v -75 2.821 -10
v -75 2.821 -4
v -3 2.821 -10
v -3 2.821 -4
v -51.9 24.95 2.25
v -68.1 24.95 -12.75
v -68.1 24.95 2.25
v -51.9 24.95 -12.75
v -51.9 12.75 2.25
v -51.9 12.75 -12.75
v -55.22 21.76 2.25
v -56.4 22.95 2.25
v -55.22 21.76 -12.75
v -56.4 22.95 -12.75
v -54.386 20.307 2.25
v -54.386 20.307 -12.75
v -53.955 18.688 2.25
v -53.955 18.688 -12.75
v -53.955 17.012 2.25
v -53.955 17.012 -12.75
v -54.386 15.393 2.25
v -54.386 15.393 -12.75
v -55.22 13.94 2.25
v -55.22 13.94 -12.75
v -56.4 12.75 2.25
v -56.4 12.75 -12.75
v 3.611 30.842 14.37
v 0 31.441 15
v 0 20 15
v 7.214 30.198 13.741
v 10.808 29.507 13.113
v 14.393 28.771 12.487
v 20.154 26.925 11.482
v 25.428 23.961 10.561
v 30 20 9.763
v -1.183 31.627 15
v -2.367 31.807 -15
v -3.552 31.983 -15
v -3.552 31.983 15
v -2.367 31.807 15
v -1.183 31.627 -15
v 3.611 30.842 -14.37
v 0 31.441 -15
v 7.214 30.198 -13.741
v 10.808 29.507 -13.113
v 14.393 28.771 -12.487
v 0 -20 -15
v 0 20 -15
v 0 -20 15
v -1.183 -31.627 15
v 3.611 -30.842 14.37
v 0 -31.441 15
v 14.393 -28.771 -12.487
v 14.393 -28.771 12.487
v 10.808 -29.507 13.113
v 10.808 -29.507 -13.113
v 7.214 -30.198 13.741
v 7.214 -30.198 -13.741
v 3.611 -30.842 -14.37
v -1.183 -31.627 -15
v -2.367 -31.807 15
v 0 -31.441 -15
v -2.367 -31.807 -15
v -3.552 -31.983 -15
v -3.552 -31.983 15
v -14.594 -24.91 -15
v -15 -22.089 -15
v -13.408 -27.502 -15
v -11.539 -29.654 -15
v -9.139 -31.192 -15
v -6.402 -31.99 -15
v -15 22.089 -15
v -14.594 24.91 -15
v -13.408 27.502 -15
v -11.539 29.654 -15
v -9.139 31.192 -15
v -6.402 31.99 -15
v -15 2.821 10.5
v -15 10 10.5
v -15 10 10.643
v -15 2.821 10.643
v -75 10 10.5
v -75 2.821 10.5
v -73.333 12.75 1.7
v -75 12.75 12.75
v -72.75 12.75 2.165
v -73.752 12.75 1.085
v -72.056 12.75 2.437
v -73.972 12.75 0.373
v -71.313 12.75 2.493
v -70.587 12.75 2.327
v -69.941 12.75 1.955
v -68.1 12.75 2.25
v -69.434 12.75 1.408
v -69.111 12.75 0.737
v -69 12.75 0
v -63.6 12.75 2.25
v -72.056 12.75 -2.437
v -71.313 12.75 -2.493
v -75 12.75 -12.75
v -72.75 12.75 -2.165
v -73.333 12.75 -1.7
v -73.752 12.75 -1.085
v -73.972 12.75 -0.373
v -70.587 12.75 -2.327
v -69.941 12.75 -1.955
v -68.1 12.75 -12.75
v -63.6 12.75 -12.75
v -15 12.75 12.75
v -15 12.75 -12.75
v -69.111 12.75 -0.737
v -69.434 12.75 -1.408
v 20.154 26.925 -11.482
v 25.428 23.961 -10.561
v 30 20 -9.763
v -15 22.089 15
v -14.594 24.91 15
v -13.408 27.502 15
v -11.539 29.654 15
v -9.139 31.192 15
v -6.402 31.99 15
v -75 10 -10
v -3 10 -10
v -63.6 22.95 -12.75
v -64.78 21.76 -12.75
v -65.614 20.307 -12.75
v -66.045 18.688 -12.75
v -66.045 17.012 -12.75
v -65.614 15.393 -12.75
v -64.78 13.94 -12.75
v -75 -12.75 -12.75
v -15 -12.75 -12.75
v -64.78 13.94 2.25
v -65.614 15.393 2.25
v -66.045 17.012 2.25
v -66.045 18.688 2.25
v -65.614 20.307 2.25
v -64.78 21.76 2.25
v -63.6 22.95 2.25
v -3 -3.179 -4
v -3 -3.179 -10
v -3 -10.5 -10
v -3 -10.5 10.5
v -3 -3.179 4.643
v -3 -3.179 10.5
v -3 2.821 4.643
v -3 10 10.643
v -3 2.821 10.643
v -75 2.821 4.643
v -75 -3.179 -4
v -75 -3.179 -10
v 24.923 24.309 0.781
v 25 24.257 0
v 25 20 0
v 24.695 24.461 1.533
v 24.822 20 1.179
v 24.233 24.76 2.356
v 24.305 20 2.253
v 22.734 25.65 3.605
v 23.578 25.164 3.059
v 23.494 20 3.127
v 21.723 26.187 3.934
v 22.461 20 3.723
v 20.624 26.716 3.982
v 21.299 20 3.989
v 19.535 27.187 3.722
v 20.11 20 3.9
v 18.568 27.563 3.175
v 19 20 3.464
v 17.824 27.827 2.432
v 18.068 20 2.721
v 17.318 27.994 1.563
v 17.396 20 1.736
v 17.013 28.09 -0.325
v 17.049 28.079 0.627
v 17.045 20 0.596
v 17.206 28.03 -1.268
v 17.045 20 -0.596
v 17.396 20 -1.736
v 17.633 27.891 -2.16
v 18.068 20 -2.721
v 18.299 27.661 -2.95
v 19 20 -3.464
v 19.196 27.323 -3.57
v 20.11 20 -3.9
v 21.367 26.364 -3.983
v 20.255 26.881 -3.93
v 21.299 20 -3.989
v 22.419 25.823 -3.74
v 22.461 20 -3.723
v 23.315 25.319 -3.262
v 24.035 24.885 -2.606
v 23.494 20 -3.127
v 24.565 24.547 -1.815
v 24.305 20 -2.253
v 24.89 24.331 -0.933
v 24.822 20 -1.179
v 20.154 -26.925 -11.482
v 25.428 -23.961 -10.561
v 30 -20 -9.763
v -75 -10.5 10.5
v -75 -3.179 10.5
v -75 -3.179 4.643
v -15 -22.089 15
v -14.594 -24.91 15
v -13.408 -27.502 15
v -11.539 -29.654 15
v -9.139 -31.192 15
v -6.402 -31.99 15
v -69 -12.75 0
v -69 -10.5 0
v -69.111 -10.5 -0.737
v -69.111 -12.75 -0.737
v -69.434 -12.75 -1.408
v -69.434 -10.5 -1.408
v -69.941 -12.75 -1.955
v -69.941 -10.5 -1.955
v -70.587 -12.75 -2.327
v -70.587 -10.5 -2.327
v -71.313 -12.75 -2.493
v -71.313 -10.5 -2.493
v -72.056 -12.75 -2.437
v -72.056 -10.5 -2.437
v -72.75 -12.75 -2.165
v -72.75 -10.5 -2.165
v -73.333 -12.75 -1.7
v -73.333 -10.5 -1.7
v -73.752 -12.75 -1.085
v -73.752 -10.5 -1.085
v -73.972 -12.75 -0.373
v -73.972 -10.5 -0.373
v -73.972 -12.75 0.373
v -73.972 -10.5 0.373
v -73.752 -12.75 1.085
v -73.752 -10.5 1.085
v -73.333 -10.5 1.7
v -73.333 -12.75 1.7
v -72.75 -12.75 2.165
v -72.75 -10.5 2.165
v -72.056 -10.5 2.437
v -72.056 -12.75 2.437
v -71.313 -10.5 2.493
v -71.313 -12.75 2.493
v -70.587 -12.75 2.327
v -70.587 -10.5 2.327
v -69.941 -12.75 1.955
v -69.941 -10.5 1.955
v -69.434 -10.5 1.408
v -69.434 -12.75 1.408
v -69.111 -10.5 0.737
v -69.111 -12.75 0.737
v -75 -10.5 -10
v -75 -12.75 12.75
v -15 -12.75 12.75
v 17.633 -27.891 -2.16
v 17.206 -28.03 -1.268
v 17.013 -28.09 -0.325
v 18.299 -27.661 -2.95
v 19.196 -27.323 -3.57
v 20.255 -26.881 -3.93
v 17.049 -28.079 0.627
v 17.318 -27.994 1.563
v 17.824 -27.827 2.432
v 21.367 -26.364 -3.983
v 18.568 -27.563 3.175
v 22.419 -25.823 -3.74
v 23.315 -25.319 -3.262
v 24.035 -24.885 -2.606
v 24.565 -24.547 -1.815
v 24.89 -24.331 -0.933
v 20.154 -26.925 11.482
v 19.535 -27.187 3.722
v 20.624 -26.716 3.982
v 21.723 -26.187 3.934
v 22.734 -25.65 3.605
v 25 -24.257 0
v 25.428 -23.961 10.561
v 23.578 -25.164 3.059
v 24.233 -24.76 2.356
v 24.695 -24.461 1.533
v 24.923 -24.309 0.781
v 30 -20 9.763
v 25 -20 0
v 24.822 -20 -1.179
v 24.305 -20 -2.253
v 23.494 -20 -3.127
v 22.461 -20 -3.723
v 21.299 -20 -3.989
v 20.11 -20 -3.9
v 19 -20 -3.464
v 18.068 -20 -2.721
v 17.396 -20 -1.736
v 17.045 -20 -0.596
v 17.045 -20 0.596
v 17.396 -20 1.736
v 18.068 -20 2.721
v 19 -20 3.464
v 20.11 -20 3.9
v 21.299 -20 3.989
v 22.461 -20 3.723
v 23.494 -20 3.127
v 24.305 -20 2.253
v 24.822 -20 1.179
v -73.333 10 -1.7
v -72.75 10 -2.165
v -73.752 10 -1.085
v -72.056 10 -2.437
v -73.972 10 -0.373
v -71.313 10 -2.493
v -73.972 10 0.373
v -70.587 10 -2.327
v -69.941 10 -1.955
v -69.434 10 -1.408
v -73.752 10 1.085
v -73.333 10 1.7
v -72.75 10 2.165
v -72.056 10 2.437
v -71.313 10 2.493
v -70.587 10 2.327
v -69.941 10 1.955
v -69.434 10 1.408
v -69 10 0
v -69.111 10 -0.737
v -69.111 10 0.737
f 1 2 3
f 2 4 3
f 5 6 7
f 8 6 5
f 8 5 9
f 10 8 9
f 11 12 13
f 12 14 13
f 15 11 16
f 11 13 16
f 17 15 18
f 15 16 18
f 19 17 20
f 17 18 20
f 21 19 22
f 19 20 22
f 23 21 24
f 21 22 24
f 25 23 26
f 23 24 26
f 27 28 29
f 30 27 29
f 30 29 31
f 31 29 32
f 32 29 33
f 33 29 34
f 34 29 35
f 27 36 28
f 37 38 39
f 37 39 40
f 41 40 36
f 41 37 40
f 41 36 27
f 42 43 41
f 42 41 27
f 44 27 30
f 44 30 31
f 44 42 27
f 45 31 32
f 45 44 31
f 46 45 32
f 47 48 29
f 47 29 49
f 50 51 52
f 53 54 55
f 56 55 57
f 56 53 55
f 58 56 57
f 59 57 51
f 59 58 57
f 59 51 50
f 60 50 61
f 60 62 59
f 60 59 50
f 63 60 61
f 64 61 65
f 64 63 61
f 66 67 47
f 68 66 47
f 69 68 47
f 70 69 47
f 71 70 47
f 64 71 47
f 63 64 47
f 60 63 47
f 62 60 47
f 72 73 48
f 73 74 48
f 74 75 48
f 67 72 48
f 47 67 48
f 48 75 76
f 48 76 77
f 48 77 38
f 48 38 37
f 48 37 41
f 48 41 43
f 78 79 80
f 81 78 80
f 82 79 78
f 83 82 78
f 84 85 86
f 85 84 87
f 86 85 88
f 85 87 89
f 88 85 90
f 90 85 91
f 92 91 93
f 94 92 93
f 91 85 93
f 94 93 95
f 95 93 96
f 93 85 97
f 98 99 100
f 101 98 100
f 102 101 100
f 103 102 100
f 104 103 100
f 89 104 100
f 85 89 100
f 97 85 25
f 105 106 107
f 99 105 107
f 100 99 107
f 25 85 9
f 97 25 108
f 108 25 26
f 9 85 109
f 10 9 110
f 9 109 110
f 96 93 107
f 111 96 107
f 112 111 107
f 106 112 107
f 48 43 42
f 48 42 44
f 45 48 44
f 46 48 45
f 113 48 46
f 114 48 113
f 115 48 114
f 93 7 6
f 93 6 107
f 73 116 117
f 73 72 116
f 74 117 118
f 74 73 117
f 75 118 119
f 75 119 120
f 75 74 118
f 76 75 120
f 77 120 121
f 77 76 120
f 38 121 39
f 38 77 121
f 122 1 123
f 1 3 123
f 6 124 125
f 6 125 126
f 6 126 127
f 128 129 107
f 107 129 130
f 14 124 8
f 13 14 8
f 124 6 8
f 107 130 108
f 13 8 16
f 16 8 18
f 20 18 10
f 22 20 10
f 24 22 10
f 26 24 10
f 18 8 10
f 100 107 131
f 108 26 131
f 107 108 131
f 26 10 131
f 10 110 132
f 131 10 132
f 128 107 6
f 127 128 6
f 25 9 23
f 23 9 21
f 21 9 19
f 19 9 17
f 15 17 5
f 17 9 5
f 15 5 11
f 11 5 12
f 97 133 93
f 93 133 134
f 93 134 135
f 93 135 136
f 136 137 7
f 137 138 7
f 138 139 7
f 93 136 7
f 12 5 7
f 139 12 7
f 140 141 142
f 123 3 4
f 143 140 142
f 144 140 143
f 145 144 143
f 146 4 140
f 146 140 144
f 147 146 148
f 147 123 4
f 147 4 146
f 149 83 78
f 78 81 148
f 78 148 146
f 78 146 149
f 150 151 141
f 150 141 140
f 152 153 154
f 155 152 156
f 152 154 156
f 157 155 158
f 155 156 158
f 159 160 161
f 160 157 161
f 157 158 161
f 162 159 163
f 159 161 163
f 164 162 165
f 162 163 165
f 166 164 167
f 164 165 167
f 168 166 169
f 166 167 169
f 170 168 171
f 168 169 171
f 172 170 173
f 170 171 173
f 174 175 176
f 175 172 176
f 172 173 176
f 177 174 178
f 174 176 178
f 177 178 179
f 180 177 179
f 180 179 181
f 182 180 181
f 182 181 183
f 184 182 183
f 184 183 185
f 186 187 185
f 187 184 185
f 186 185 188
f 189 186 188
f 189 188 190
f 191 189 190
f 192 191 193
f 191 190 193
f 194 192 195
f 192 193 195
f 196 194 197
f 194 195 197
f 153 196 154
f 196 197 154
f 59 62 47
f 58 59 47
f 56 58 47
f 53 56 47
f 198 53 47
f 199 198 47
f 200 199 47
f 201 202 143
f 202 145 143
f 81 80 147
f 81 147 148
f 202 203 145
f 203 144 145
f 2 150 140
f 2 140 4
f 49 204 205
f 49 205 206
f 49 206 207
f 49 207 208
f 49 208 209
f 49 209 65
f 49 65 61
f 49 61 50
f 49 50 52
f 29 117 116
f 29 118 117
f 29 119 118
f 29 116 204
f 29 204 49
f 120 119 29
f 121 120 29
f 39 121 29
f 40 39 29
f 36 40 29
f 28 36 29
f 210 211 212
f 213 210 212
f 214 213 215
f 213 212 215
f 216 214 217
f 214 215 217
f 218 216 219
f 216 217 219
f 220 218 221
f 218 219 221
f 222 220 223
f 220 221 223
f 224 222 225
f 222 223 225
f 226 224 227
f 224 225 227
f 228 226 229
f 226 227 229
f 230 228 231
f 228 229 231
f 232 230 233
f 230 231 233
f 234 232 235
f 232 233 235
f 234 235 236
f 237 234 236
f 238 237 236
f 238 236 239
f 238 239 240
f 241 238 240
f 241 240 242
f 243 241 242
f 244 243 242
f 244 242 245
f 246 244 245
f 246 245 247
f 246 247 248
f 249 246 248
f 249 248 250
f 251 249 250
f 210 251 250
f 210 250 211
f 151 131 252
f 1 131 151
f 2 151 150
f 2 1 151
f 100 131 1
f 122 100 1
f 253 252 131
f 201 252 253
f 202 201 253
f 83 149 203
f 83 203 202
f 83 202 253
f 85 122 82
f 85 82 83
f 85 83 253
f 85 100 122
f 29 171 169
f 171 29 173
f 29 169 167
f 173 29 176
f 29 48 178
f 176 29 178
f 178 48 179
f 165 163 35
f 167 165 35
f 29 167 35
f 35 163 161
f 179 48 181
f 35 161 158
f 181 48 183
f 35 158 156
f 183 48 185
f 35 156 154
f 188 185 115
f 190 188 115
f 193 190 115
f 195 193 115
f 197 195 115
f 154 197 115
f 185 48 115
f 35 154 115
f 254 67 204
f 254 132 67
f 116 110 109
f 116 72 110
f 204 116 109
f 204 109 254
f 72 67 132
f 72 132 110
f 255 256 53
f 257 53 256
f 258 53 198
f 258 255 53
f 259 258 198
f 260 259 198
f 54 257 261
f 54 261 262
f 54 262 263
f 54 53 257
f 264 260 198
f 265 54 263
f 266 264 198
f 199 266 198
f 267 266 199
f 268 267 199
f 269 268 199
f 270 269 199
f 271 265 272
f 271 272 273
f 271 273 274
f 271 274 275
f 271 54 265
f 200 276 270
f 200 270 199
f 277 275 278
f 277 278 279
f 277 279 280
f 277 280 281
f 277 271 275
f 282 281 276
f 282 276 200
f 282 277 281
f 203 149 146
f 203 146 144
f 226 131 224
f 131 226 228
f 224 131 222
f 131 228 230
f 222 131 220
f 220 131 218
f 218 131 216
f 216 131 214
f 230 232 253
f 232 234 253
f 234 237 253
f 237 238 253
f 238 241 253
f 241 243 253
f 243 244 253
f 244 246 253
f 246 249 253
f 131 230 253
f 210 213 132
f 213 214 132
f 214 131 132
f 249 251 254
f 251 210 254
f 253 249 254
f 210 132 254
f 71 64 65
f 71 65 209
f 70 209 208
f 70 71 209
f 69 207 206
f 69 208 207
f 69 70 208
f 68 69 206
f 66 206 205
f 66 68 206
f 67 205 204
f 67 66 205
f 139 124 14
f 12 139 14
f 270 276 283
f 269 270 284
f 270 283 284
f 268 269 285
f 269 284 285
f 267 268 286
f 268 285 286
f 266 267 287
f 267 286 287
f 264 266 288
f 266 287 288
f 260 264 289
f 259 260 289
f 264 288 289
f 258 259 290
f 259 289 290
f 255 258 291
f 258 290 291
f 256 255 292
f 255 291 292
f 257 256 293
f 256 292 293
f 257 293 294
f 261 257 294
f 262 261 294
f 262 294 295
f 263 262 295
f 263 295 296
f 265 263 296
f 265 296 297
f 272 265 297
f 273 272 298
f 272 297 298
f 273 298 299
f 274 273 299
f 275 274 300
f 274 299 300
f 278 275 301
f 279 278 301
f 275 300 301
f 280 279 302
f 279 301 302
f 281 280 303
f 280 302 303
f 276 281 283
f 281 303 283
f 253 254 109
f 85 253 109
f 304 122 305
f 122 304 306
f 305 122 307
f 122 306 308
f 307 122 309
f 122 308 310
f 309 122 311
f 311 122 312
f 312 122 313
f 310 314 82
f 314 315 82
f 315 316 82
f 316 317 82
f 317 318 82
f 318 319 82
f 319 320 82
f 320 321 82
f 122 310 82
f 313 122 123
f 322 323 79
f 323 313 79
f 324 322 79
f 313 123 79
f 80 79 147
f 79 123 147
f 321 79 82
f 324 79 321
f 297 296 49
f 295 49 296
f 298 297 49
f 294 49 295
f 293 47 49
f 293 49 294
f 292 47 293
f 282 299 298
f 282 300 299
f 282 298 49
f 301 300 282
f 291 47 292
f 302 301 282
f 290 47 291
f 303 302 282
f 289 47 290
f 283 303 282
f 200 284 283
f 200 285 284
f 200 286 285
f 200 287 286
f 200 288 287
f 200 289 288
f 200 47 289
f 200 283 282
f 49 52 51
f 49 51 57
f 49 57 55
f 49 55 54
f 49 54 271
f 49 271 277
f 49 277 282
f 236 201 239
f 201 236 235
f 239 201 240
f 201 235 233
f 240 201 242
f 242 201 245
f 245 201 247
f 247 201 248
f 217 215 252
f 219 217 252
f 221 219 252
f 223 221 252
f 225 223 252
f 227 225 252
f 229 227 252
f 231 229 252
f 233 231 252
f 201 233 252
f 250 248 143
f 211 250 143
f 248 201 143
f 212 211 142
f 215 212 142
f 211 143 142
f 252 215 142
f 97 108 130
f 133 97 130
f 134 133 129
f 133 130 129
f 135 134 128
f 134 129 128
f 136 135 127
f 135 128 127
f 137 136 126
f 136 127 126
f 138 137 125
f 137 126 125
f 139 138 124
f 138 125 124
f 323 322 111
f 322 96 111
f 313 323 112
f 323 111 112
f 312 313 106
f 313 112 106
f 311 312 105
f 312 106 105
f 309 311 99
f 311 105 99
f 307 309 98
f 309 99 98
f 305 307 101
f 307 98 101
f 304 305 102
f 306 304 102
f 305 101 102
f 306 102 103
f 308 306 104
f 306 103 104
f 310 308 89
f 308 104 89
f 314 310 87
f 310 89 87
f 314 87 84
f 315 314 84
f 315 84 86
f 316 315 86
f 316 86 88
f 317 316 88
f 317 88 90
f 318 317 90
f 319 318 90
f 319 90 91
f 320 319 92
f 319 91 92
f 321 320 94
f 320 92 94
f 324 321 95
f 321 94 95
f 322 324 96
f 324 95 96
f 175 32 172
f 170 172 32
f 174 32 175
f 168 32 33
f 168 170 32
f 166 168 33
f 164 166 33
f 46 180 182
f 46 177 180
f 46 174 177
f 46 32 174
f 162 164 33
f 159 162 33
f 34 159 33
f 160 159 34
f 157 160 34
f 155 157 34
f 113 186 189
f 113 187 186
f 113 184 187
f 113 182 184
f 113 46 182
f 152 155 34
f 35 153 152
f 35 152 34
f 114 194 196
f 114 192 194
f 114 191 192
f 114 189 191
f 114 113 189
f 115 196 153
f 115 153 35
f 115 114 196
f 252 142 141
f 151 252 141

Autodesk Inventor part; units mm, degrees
ref_plane "YZ Plane" through (0, 0, 0) normal (1, 0, 0) x (0, 1, 0)
ref_plane "XZ Plane" through (0, 0, 0) normal (0, 1, 0) x (-1, 0, 0)
ref_plane "XY Plane" through (0, 0, 0) normal (0, 0, 1) x (1, 0, 0)
sketch "Sketch1" plane through (0, 0, 0) normal (0, 0, 1) x (1, 0, 0)
  line L0 (0, 20) -> (30, 20)
  line L1 (0, 20) -> (0, 0)
  line L2 (-45, 20) -> (-45, 35)
  arc A0 (30, 25) -> (-45, 35) centre (-45, -251.25) ccw
  line L3 (-45, 20) -> (-45, 0)
  line L4 (0, -20) -> (30, -20)
  line L5 (45, -20) -> (45, -20.4834)
  line L6 (0, -20) -> (0, 0)
  line L7 (-45, -20) -> (-45, -35)
  arc A1 (-45, -35) -> (30, -25) centre (-45, 251.25) ccw
  line L8 (-45, -20) -> (-45, 0)
  line L9 (30, 25) -> (30, 20)
  line L10 (30, -25) -> (30, -20)
  point P0 (45, 20.4834)
  point P1 (45, 22.5)
  point P2 (30, 37.5)
  point P3 (-25, -20)
  point P4 (0, -32.987)
  point P5 (45, -22.5)
  point P6 (30, -37.5)
  point P7 (45, -22.5)
  point P8 (30, -37.5)
  dimension "d17" = 15
extrude "Extrusion1" add sketch "Sketch1" along normal mid plane 30
sketch "Sketch3" plane through (0, -20, 15) normal (0, 1, 0) x (1, 0, 0)
  line L0 (0, 0) -> (0, 30) projected
  line L1 (30, 0) -> (0, 0) projected
  line L2 (0, 30) -> (30, 30) projected
  circle A0 centre (36.5, 15) radius 2
  line L3 (30, 30) -> (30, 0) projected
  point P0 (0, 15)
  dimension "d18" = 4
extrude "Extrusion3" cut sketch "Sketch3" along normal through all both and the other way through all contours A0
fillet "Fillet3" radius 30 1 edges at (30, 25, 0)
fillet "Fillet4" radius 30 1 edges at (30, -25, 0)
sketch "Sketch6" plane through (-45, -35, 15) normal (-1, 0, 0) x (0, 0, 1)
  line L0 (-24.0585, 25.4415) -> (-25, 24.5) construction
  line L1 (-4.3571, 37.8214) -> (-10.3571, 37.8214)
  line L2 (-10.3571, 37.8214) -> (-10.3571, 31.8214)
  line L3 (-10.3571, 31.8214) -> (-4.5, 31.8214)
  line L4 (-25, 37.8214) -> (-19, 37.8214)
  line L5 (-19, 37.8214) -> (-19, 31.8214)
  line L6 (-19, 31.8214) -> (-25, 31.8214)
  line L7 (-25, 24.5) -> (-25, 31.8214)
  line L8 (-25, 37.8214) -> (-25, 45)
  line L9 (-4.3571, 45) -> (-4.3571, 37.8214)
  line L10 (-4.5, 31.8214) -> (-4.5, 24.5)
  line L11 (-11.6786, 45) -> (-11.6786, 39)
  line L12 (-11.6786, 39) -> (-17.6786, 39)
  line L13 (-17.6786, 39) -> (-17.6786, 45)
  line L14 (-25, 45) -> (-17.6786, 45)
  line L15 (-11.6786, 45) -> (-4.3571, 45)
  line L16 (-17.6786, 24.5) -> (-17.6786, 30.5)
  line L17 (-17.6786, 30.5) -> (-11.6786, 30.5)
  line L18 (-11.6786, 30.5) -> (-11.6786, 24.5)
  line L19 (-4.5, 24.5) -> (-11.6786, 24.5)
  line L20 (-17.6786, 24.5) -> (-25, 24.5)
  dimension "d59" = 20.5
  dimension "d67" = 6
  dimension "d68" = 6
  dimension "d69" = 6
  dimension "d70" = 6
  dimension "d71" = 6
  dimension "d73" = 6
extrude "Extrusion5" cut sketch "Sketch6" against normal blind 42
sketch "Sketch7" plane through (-45, -35, 15) normal (-1, 0, 0) x (0, 0, 1)
  line L0 (-30, 50) -> (0, 50)
  line L1 (0, 50) -> (0, 20)
  line L2 (0, 20) -> (-30, 20)
  line L3 (-30, 20) -> (-30, 50)
  line L4 (-30, 50) -> (0, 20) construction
  line L5 (0, 50) -> (-30, 20) construction
  line L6 (-22.5355, 32.4645) -> (-22.5355, 28.5251) projected
  line L7 (-24.5355, 32.4645) -> (-22.5355, 32.4645) projected
  line L8 (-24.5355, 25.4645) -> (-24.5355, 32.4645) projected
  line L9 (-17.5355, 25.4645) -> (-24.5355, 25.4645) projected
  line L10 (-17.5355, 27.4645) -> (-17.5355, 25.4645) projected
  line L11 (-21.4749, 27.4645) -> (-17.5355, 27.4645) projected
  line L12 (-17.9393, 31) -> (-21.4749, 27.4645) projected
  line L13 (-12.0607, 31) -> (-17.9393, 31) projected
  line L14 (-8.5251, 27.4645) -> (-12.0607, 31) projected
  line L15 (-12.4645, 27.4645) -> (-8.5251, 27.4645) projected
  line L16 (-12.4645, 25.4645) -> (-12.4645, 27.4645) projected
  line L17 (-5.4645, 25.4645) -> (-12.4645, 25.4645) projected
  line L18 (-5.4645, 32.4645) -> (-5.4645, 25.4645) projected
  line L19 (-7.4645, 32.4645) -> (-5.4645, 32.4645) projected
  line L20 (-7.4645, 28.5251) -> (-7.4645, 32.4645) projected
  line L21 (-11, 32.0607) -> (-7.4645, 28.5251) projected
  line L22 (-11, 37.9393) -> (-11, 32.0607) projected
  line L23 (-7.4645, 41.4749) -> (-11, 37.9393) projected
  line L24 (-7.4645, 37.5355) -> (-7.4645, 41.4749) projected
  line L25 (-5.4645, 37.5355) -> (-7.4645, 37.5355) projected
  line L26 (-5.4645, 44.5355) -> (-5.4645, 37.5355) projected
  line L27 (-12.4645, 44.5355) -> (-5.4645, 44.5355) projected
  line L28 (-12.4645, 42.5355) -> (-12.4645, 44.5355) projected
  line L29 (-8.5251, 42.5355) -> (-12.4645, 42.5355) projected
  line L30 (-12.0607, 39) -> (-8.5251, 42.5355) projected
  line L31 (-17.9393, 39) -> (-12.0607, 39) projected
  line L32 (-21.4749, 42.5355) -> (-17.9393, 39) projected
  line L33 (-17.5355, 42.5355) -> (-21.4749, 42.5355) projected
  line L34 (-17.5355, 44.5355) -> (-17.5355, 42.5355) projected
  line L35 (-24.5355, 44.5355) -> (-17.5355, 44.5355) projected
  line L36 (-24.5355, 37.5355) -> (-24.5355, 44.5355) projected
  line L37 (-22.5355, 37.5355) -> (-24.5355, 37.5355) projected
  line L38 (-22.5355, 41.4749) -> (-22.5355, 37.5355) projected
  line L39 (-19, 37.9393) -> (-22.5355, 41.4749) projected
  line L40 (-19, 32.0607) -> (-19, 37.9393) projected
  line L41 (-22.5355, 28.5251) -> (-19, 32.0607) projected
  line L42 (-30, 70) -> (0, 70) projected
  line L43 (-30, 0) -> (-30, 70) projected
  line L44 (0, 70) -> (0, 0) projected
  line L45 (-30, 0) -> (0, 0) projected
  point P0 (-15, 35)
  dimension "d47" = 30
  dimension "d48" = 30
extrude "Extrusion6" cut sketch "Sketch7" against normal blind 30 contours L43 L42 L44 L0 | L0 L1 L2 L3 | L2 L44 L45 L43 | L6 L41 L40 L39 L38 L37 L36 L35 L34 L33 L32 L31 L30 L29 L28 L27 L26 L25 L24 L23 L22 L21 L20 L19 L18 L17 L16 L15 L14 L13 L12 L11 L10 L9 L8 L7
fillet "Fillet5" radius 10 1 edges at (-15, 33.4236, 0)
fillet "Fillet6" radius 10 1 edges at (-15, -33.4236, 0)
sketch "Sketch8" plane through (0, -20, 15) normal (0, 1, 0) x (1, 0, 0)
  line L0 (0, 0) -> (0, 30) projected
  line L1 (30, 0) -> (0, 0) projected
  line L2 (0, 30) -> (30, 30) projected
  circle A0 centre (36.5, 15) radius 2 projected
  arc A1 (37.9617, 6.6266) -> (37.9617, 23.3734) centre (36.5, 15) ccw
  line L3 (0, 0) -> (37.9617, 6.6266)
  line L4 (0, 30) -> (37.9617, 23.3734)
  line L5 (-15, 0) -> (-15, 30) projected
  line L6 (0, 0) -> (-15, 0)
  line L7 (-15, 0) -> (-15, 30)
  line L8 (-15, 0) -> (-15, 30)
  line L9 (0, 12.4645) -> (0, 5.4645) projected
  line L10 (-15, 30) -> (0, 30)
  line L11 (-3.552, 30) -> (-3.552, 0) projected
  line L12 (30, 30) -> (30, 0) projected
  point P0 (0, 15)
extrude "Extrusion7" cut sketch "Sketch8" along normal through all both and the other way through all contours L6 L11 L10 L0 | L0 L4 L12 L3 | L12 L4 A1 L3 | L6 L5 L10 L11 | A0 keep common part
sketch "Sketch9" plane through (0, -20, 15) normal (0, 1, 0) x (1, 0, 0)
  circle A0 centre (21, 15) radius 4
  line L0 (30, 24.7632) -> (30, 5.2368) projected
  point P0 (0, 15)
  point P1 (30, 15)
  dimension "d55" = 8
  dimension "d56" = 9
extrude "Extrusion8" cut sketch "Sketch9" along normal through all both and the other way through all
sketch "Sketch10" plane through (-15, -35, 15) normal (-1, 0, 0) x (0, 0, 1)
  point P0 (-15, 35)
sketch "Sketch11" plane through (-15, -35, 15) normal (-1, 0, 0) x (0, 0, 1)
  line L0 (-25, 45) -> (-17.6786, 45) projected
  line L1 (-4.5, 24.5) -> (-11.6786, 24.5) projected
  line L2 (-27.75, 22.25) -> (-2.25, 22.25)
  line L3 (-2.25, 22.25) -> (-2.25, 47.75)
  line L4 (-2.25, 47.75) -> (-27.75, 47.75)
  line L5 (-27.75, 47.75) -> (-27.75, 22.25)
  line L6 (-17.6786, 45) -> (-17.6786, 39) projected
  line L7 (-17.6786, 45) -> (-17.6786, 39)
  line L8 (-17.6786, 39) -> (-11.6786, 39) projected
  line L9 (-17.6786, 39) -> (-11.6786, 39)
  line L10 (-11.6786, 39) -> (-11.6786, 45) projected
  line L11 (-11.6786, 39) -> (-11.6786, 45)
  line L12 (-10.3571, 37.8214) -> (-4.3571, 37.8214) projected
  line L13 (-4.3571, 37.8214) -> (-10.3571, 37.8214)
  line L14 (-10.3571, 37.8214) -> (-10.3571, 31.8214) projected
  line L15 (-10.3571, 37.8214) -> (-10.3571, 31.8214)
  line L16 (-4.5, 31.8214) -> (-10.3571, 31.8214) projected
  line L17 (-10.3571, 31.8214) -> (-4.5, 31.8214)
  line L18 (-11.6786, 30.5) -> (-11.6786, 24.5) projected
  line L19 (-11.6786, 24.5) -> (-11.6786, 30.5)
  line L20 (-17.6786, 30.5) -> (-11.6786, 30.5) projected
  line L21 (-11.6786, 30.5) -> (-17.6786, 30.5)
  line L22 (-17.6786, 30.5) -> (-17.6786, 24.5) projected
  line L23 (-17.6786, 30.5) -> (-17.6786, 24.5)
  line L24 (-19, 37.8214) -> (-25, 37.8214) projected
  line L25 (-25, 37.8214) -> (-19, 37.8214)
  line L26 (-25, 31.8214) -> (-19, 31.8214) projected
  line L27 (-19, 37.8214) -> (-19, 31.8214)
  line L28 (-19, 31.8214) -> (-25, 31.8214)
  line L29 (-25, 45) -> (-17.6786, 45)
  line L30 (-11.6786, 45) -> (-4.5, 45)
  line L31 (-25, 24.5) -> (-25, 31.8214)
  line L32 (-25, 37.8214) -> (-25, 45)
  line L33 (-4.5, 24.5) -> (-11.6786, 24.5)
  line L34 (-17.6786, 24.5) -> (-25, 24.5)
  line L35 (-4.5, 45) -> (-4.5, 37.8214)
  line L36 (-4.5, 31.8214) -> (-4.5, 24.5)
  point P0 (-15, 35)
extrude "Extrusion9" add sketch "Sketch11" along normal blind 45
sketch "Sketch12" plane through (-60, -35, 15) normal (-1, 0, 0) x (0, 0, 1)
  line L0 (-17.6786, 45) -> (-17.6786, 39) projected
  line L1 (-17.6786, 45) -> (-17.6786, 39)
  line L2 (-17.6786, 39) -> (-11.6786, 39) projected
  line L3 (-17.6786, 39) -> (-11.6786, 39)
  line L4 (-11.6786, 39) -> (-11.6786, 45) projected
  line L5 (-11.6786, 39) -> (-11.6786, 45)
  line L6 (-11.6786, 45) -> (-17.6786, 45)
  line L7 (-11.6786, 30.5) -> (-17.6786, 30.5) projected
  line L8 (-17.6786, 30.5) -> (-11.6786, 30.5)
  line L9 (-11.6786, 24.5) -> (-11.6786, 30.5) projected
  line L10 (-11.6786, 30.5) -> (-11.6786, 24.5)
  line L11 (-17.6786, 24.5) -> (-25, 24.5) projected
  line L12 (-11.6786, 24.5) -> (-17.6786, 24.5)
  line L13 (-17.6786, 24.5) -> (-17.6786, 30.5)
  point P0 (-15, 35)
extrude "Extrusion10" cut sketch "Sketch12" against normal up to surface (57 mm away)
sketch "Sketch13" plane through (-15, 12.75, 12.75) normal (0, 1, 0) x (1, 0, 0)
  point P0 (15, 12.75)
sketch "Sketch15" plane through (-15, -12.75, -12.75) normal (0, 0, -1) x (-1, 0, 0)
  line L0 (0, 25.5) -> (45, 25.5) projected
  line L1 (41.4, 35.7) -> (45, 35.7)
  arc A0 (41.4, 35.7) -> (41.4, 25.5) centre (45.352, 30.6) ccw
  line L2 (48.6, 35.7) -> (45, 35.7)
  arc A1 (48.6, 25.5) -> (48.6, 35.7) centre (44.648, 30.6) ccw
  line L3 (0, 25.5) -> (45, 25.5) projected
  line L4 (0, 22.75) -> (45, 22.75) projected
  line L5 (45, 37.7) -> (36.9, 37.7)
  line L6 (36.9, 37.7) -> (36.9, 25.5)
  line L7 (45, 37.7) -> (53.1, 37.7)
  line L8 (53.1, 37.7) -> (53.1, 25.5)
  line L9 (36.9, 25.5) -> (41.4, 25.5)
  line L10 (48.6, 25.5) -> (53.1, 25.5)
  line L11 (45, 0) -> (45, 25.5) projected
  point P0 (-15, 12.75)
  point P1 (38.9, 25.5)
  point P2 (38.9, 35.7)
  point P3 (51.1, 25.5)
  point P4 (51.1, 35.7)
  dimension "d85" = 10.2
extrude "Extrusion12" add sketch "Sketch15" against normal blind 15
sketch "Sketch16" plane through (-60, -35, 15) normal (-1, 0, 0) x (0, 0, 1)
  line L0 (-4.5, 24.5) -> (-25, 24.5) projected
  line L1 (-25, 24.5) -> (-25, 31.8214) projected
  line L2 (-25, 31.8214) -> (-19, 31.8214) projected
  line L3 (-19, 31.8214) -> (-19, 37.8214) projected
  line L4 (-19, 37.8214) -> (-25, 37.8214) projected
  line L5 (-25, 37.8214) -> (-25, 45) projected
  line L6 (-25, 45) -> (-4.5, 45) projected
  line L7 (-4.5, 45) -> (-4.5, 37.8214) projected
  line L8 (-4.5, 37.8214) -> (-10.3571, 37.8214) projected
  line L9 (-10.3571, 37.8214) -> (-10.3571, 31.8214) projected
  line L10 (-10.3571, 31.8214) -> (-4.5, 31.8214) projected
  line L11 (-4.5, 31.8214) -> (-4.5, 24.5) projected
  line L12 (-2.25, 22.25) -> (-2.25, 47.75) projected
  line L13 (-2.25, 47.75) -> (-27.75, 47.75) projected
  line L14 (-27.75, 47.75) -> (-27.75, 22.25) projected
  line L15 (-27.75, 22.25) -> (-2.25, 22.25) projected
  point P0 (-15, 35)
extrude "Extrusion13" add sketch "Sketch16" along normal blind 15
sketch "Sketch17" plane through (-15, 12.75, 12.75) normal (0, 1, 0) x (1, 0, 0)
  circle A0 centre (-56.5, 12.75) radius 2.5
  line L0 (-60, 0) -> (-60, 25.5) projected
  point P0 (15, 12.75)
  dimension "d96" = 5
  dimension "d97" = 3.5
extrude "Extrusion14" cut sketch "Sketch17" against normal through all
properties part number "Nuckle"
